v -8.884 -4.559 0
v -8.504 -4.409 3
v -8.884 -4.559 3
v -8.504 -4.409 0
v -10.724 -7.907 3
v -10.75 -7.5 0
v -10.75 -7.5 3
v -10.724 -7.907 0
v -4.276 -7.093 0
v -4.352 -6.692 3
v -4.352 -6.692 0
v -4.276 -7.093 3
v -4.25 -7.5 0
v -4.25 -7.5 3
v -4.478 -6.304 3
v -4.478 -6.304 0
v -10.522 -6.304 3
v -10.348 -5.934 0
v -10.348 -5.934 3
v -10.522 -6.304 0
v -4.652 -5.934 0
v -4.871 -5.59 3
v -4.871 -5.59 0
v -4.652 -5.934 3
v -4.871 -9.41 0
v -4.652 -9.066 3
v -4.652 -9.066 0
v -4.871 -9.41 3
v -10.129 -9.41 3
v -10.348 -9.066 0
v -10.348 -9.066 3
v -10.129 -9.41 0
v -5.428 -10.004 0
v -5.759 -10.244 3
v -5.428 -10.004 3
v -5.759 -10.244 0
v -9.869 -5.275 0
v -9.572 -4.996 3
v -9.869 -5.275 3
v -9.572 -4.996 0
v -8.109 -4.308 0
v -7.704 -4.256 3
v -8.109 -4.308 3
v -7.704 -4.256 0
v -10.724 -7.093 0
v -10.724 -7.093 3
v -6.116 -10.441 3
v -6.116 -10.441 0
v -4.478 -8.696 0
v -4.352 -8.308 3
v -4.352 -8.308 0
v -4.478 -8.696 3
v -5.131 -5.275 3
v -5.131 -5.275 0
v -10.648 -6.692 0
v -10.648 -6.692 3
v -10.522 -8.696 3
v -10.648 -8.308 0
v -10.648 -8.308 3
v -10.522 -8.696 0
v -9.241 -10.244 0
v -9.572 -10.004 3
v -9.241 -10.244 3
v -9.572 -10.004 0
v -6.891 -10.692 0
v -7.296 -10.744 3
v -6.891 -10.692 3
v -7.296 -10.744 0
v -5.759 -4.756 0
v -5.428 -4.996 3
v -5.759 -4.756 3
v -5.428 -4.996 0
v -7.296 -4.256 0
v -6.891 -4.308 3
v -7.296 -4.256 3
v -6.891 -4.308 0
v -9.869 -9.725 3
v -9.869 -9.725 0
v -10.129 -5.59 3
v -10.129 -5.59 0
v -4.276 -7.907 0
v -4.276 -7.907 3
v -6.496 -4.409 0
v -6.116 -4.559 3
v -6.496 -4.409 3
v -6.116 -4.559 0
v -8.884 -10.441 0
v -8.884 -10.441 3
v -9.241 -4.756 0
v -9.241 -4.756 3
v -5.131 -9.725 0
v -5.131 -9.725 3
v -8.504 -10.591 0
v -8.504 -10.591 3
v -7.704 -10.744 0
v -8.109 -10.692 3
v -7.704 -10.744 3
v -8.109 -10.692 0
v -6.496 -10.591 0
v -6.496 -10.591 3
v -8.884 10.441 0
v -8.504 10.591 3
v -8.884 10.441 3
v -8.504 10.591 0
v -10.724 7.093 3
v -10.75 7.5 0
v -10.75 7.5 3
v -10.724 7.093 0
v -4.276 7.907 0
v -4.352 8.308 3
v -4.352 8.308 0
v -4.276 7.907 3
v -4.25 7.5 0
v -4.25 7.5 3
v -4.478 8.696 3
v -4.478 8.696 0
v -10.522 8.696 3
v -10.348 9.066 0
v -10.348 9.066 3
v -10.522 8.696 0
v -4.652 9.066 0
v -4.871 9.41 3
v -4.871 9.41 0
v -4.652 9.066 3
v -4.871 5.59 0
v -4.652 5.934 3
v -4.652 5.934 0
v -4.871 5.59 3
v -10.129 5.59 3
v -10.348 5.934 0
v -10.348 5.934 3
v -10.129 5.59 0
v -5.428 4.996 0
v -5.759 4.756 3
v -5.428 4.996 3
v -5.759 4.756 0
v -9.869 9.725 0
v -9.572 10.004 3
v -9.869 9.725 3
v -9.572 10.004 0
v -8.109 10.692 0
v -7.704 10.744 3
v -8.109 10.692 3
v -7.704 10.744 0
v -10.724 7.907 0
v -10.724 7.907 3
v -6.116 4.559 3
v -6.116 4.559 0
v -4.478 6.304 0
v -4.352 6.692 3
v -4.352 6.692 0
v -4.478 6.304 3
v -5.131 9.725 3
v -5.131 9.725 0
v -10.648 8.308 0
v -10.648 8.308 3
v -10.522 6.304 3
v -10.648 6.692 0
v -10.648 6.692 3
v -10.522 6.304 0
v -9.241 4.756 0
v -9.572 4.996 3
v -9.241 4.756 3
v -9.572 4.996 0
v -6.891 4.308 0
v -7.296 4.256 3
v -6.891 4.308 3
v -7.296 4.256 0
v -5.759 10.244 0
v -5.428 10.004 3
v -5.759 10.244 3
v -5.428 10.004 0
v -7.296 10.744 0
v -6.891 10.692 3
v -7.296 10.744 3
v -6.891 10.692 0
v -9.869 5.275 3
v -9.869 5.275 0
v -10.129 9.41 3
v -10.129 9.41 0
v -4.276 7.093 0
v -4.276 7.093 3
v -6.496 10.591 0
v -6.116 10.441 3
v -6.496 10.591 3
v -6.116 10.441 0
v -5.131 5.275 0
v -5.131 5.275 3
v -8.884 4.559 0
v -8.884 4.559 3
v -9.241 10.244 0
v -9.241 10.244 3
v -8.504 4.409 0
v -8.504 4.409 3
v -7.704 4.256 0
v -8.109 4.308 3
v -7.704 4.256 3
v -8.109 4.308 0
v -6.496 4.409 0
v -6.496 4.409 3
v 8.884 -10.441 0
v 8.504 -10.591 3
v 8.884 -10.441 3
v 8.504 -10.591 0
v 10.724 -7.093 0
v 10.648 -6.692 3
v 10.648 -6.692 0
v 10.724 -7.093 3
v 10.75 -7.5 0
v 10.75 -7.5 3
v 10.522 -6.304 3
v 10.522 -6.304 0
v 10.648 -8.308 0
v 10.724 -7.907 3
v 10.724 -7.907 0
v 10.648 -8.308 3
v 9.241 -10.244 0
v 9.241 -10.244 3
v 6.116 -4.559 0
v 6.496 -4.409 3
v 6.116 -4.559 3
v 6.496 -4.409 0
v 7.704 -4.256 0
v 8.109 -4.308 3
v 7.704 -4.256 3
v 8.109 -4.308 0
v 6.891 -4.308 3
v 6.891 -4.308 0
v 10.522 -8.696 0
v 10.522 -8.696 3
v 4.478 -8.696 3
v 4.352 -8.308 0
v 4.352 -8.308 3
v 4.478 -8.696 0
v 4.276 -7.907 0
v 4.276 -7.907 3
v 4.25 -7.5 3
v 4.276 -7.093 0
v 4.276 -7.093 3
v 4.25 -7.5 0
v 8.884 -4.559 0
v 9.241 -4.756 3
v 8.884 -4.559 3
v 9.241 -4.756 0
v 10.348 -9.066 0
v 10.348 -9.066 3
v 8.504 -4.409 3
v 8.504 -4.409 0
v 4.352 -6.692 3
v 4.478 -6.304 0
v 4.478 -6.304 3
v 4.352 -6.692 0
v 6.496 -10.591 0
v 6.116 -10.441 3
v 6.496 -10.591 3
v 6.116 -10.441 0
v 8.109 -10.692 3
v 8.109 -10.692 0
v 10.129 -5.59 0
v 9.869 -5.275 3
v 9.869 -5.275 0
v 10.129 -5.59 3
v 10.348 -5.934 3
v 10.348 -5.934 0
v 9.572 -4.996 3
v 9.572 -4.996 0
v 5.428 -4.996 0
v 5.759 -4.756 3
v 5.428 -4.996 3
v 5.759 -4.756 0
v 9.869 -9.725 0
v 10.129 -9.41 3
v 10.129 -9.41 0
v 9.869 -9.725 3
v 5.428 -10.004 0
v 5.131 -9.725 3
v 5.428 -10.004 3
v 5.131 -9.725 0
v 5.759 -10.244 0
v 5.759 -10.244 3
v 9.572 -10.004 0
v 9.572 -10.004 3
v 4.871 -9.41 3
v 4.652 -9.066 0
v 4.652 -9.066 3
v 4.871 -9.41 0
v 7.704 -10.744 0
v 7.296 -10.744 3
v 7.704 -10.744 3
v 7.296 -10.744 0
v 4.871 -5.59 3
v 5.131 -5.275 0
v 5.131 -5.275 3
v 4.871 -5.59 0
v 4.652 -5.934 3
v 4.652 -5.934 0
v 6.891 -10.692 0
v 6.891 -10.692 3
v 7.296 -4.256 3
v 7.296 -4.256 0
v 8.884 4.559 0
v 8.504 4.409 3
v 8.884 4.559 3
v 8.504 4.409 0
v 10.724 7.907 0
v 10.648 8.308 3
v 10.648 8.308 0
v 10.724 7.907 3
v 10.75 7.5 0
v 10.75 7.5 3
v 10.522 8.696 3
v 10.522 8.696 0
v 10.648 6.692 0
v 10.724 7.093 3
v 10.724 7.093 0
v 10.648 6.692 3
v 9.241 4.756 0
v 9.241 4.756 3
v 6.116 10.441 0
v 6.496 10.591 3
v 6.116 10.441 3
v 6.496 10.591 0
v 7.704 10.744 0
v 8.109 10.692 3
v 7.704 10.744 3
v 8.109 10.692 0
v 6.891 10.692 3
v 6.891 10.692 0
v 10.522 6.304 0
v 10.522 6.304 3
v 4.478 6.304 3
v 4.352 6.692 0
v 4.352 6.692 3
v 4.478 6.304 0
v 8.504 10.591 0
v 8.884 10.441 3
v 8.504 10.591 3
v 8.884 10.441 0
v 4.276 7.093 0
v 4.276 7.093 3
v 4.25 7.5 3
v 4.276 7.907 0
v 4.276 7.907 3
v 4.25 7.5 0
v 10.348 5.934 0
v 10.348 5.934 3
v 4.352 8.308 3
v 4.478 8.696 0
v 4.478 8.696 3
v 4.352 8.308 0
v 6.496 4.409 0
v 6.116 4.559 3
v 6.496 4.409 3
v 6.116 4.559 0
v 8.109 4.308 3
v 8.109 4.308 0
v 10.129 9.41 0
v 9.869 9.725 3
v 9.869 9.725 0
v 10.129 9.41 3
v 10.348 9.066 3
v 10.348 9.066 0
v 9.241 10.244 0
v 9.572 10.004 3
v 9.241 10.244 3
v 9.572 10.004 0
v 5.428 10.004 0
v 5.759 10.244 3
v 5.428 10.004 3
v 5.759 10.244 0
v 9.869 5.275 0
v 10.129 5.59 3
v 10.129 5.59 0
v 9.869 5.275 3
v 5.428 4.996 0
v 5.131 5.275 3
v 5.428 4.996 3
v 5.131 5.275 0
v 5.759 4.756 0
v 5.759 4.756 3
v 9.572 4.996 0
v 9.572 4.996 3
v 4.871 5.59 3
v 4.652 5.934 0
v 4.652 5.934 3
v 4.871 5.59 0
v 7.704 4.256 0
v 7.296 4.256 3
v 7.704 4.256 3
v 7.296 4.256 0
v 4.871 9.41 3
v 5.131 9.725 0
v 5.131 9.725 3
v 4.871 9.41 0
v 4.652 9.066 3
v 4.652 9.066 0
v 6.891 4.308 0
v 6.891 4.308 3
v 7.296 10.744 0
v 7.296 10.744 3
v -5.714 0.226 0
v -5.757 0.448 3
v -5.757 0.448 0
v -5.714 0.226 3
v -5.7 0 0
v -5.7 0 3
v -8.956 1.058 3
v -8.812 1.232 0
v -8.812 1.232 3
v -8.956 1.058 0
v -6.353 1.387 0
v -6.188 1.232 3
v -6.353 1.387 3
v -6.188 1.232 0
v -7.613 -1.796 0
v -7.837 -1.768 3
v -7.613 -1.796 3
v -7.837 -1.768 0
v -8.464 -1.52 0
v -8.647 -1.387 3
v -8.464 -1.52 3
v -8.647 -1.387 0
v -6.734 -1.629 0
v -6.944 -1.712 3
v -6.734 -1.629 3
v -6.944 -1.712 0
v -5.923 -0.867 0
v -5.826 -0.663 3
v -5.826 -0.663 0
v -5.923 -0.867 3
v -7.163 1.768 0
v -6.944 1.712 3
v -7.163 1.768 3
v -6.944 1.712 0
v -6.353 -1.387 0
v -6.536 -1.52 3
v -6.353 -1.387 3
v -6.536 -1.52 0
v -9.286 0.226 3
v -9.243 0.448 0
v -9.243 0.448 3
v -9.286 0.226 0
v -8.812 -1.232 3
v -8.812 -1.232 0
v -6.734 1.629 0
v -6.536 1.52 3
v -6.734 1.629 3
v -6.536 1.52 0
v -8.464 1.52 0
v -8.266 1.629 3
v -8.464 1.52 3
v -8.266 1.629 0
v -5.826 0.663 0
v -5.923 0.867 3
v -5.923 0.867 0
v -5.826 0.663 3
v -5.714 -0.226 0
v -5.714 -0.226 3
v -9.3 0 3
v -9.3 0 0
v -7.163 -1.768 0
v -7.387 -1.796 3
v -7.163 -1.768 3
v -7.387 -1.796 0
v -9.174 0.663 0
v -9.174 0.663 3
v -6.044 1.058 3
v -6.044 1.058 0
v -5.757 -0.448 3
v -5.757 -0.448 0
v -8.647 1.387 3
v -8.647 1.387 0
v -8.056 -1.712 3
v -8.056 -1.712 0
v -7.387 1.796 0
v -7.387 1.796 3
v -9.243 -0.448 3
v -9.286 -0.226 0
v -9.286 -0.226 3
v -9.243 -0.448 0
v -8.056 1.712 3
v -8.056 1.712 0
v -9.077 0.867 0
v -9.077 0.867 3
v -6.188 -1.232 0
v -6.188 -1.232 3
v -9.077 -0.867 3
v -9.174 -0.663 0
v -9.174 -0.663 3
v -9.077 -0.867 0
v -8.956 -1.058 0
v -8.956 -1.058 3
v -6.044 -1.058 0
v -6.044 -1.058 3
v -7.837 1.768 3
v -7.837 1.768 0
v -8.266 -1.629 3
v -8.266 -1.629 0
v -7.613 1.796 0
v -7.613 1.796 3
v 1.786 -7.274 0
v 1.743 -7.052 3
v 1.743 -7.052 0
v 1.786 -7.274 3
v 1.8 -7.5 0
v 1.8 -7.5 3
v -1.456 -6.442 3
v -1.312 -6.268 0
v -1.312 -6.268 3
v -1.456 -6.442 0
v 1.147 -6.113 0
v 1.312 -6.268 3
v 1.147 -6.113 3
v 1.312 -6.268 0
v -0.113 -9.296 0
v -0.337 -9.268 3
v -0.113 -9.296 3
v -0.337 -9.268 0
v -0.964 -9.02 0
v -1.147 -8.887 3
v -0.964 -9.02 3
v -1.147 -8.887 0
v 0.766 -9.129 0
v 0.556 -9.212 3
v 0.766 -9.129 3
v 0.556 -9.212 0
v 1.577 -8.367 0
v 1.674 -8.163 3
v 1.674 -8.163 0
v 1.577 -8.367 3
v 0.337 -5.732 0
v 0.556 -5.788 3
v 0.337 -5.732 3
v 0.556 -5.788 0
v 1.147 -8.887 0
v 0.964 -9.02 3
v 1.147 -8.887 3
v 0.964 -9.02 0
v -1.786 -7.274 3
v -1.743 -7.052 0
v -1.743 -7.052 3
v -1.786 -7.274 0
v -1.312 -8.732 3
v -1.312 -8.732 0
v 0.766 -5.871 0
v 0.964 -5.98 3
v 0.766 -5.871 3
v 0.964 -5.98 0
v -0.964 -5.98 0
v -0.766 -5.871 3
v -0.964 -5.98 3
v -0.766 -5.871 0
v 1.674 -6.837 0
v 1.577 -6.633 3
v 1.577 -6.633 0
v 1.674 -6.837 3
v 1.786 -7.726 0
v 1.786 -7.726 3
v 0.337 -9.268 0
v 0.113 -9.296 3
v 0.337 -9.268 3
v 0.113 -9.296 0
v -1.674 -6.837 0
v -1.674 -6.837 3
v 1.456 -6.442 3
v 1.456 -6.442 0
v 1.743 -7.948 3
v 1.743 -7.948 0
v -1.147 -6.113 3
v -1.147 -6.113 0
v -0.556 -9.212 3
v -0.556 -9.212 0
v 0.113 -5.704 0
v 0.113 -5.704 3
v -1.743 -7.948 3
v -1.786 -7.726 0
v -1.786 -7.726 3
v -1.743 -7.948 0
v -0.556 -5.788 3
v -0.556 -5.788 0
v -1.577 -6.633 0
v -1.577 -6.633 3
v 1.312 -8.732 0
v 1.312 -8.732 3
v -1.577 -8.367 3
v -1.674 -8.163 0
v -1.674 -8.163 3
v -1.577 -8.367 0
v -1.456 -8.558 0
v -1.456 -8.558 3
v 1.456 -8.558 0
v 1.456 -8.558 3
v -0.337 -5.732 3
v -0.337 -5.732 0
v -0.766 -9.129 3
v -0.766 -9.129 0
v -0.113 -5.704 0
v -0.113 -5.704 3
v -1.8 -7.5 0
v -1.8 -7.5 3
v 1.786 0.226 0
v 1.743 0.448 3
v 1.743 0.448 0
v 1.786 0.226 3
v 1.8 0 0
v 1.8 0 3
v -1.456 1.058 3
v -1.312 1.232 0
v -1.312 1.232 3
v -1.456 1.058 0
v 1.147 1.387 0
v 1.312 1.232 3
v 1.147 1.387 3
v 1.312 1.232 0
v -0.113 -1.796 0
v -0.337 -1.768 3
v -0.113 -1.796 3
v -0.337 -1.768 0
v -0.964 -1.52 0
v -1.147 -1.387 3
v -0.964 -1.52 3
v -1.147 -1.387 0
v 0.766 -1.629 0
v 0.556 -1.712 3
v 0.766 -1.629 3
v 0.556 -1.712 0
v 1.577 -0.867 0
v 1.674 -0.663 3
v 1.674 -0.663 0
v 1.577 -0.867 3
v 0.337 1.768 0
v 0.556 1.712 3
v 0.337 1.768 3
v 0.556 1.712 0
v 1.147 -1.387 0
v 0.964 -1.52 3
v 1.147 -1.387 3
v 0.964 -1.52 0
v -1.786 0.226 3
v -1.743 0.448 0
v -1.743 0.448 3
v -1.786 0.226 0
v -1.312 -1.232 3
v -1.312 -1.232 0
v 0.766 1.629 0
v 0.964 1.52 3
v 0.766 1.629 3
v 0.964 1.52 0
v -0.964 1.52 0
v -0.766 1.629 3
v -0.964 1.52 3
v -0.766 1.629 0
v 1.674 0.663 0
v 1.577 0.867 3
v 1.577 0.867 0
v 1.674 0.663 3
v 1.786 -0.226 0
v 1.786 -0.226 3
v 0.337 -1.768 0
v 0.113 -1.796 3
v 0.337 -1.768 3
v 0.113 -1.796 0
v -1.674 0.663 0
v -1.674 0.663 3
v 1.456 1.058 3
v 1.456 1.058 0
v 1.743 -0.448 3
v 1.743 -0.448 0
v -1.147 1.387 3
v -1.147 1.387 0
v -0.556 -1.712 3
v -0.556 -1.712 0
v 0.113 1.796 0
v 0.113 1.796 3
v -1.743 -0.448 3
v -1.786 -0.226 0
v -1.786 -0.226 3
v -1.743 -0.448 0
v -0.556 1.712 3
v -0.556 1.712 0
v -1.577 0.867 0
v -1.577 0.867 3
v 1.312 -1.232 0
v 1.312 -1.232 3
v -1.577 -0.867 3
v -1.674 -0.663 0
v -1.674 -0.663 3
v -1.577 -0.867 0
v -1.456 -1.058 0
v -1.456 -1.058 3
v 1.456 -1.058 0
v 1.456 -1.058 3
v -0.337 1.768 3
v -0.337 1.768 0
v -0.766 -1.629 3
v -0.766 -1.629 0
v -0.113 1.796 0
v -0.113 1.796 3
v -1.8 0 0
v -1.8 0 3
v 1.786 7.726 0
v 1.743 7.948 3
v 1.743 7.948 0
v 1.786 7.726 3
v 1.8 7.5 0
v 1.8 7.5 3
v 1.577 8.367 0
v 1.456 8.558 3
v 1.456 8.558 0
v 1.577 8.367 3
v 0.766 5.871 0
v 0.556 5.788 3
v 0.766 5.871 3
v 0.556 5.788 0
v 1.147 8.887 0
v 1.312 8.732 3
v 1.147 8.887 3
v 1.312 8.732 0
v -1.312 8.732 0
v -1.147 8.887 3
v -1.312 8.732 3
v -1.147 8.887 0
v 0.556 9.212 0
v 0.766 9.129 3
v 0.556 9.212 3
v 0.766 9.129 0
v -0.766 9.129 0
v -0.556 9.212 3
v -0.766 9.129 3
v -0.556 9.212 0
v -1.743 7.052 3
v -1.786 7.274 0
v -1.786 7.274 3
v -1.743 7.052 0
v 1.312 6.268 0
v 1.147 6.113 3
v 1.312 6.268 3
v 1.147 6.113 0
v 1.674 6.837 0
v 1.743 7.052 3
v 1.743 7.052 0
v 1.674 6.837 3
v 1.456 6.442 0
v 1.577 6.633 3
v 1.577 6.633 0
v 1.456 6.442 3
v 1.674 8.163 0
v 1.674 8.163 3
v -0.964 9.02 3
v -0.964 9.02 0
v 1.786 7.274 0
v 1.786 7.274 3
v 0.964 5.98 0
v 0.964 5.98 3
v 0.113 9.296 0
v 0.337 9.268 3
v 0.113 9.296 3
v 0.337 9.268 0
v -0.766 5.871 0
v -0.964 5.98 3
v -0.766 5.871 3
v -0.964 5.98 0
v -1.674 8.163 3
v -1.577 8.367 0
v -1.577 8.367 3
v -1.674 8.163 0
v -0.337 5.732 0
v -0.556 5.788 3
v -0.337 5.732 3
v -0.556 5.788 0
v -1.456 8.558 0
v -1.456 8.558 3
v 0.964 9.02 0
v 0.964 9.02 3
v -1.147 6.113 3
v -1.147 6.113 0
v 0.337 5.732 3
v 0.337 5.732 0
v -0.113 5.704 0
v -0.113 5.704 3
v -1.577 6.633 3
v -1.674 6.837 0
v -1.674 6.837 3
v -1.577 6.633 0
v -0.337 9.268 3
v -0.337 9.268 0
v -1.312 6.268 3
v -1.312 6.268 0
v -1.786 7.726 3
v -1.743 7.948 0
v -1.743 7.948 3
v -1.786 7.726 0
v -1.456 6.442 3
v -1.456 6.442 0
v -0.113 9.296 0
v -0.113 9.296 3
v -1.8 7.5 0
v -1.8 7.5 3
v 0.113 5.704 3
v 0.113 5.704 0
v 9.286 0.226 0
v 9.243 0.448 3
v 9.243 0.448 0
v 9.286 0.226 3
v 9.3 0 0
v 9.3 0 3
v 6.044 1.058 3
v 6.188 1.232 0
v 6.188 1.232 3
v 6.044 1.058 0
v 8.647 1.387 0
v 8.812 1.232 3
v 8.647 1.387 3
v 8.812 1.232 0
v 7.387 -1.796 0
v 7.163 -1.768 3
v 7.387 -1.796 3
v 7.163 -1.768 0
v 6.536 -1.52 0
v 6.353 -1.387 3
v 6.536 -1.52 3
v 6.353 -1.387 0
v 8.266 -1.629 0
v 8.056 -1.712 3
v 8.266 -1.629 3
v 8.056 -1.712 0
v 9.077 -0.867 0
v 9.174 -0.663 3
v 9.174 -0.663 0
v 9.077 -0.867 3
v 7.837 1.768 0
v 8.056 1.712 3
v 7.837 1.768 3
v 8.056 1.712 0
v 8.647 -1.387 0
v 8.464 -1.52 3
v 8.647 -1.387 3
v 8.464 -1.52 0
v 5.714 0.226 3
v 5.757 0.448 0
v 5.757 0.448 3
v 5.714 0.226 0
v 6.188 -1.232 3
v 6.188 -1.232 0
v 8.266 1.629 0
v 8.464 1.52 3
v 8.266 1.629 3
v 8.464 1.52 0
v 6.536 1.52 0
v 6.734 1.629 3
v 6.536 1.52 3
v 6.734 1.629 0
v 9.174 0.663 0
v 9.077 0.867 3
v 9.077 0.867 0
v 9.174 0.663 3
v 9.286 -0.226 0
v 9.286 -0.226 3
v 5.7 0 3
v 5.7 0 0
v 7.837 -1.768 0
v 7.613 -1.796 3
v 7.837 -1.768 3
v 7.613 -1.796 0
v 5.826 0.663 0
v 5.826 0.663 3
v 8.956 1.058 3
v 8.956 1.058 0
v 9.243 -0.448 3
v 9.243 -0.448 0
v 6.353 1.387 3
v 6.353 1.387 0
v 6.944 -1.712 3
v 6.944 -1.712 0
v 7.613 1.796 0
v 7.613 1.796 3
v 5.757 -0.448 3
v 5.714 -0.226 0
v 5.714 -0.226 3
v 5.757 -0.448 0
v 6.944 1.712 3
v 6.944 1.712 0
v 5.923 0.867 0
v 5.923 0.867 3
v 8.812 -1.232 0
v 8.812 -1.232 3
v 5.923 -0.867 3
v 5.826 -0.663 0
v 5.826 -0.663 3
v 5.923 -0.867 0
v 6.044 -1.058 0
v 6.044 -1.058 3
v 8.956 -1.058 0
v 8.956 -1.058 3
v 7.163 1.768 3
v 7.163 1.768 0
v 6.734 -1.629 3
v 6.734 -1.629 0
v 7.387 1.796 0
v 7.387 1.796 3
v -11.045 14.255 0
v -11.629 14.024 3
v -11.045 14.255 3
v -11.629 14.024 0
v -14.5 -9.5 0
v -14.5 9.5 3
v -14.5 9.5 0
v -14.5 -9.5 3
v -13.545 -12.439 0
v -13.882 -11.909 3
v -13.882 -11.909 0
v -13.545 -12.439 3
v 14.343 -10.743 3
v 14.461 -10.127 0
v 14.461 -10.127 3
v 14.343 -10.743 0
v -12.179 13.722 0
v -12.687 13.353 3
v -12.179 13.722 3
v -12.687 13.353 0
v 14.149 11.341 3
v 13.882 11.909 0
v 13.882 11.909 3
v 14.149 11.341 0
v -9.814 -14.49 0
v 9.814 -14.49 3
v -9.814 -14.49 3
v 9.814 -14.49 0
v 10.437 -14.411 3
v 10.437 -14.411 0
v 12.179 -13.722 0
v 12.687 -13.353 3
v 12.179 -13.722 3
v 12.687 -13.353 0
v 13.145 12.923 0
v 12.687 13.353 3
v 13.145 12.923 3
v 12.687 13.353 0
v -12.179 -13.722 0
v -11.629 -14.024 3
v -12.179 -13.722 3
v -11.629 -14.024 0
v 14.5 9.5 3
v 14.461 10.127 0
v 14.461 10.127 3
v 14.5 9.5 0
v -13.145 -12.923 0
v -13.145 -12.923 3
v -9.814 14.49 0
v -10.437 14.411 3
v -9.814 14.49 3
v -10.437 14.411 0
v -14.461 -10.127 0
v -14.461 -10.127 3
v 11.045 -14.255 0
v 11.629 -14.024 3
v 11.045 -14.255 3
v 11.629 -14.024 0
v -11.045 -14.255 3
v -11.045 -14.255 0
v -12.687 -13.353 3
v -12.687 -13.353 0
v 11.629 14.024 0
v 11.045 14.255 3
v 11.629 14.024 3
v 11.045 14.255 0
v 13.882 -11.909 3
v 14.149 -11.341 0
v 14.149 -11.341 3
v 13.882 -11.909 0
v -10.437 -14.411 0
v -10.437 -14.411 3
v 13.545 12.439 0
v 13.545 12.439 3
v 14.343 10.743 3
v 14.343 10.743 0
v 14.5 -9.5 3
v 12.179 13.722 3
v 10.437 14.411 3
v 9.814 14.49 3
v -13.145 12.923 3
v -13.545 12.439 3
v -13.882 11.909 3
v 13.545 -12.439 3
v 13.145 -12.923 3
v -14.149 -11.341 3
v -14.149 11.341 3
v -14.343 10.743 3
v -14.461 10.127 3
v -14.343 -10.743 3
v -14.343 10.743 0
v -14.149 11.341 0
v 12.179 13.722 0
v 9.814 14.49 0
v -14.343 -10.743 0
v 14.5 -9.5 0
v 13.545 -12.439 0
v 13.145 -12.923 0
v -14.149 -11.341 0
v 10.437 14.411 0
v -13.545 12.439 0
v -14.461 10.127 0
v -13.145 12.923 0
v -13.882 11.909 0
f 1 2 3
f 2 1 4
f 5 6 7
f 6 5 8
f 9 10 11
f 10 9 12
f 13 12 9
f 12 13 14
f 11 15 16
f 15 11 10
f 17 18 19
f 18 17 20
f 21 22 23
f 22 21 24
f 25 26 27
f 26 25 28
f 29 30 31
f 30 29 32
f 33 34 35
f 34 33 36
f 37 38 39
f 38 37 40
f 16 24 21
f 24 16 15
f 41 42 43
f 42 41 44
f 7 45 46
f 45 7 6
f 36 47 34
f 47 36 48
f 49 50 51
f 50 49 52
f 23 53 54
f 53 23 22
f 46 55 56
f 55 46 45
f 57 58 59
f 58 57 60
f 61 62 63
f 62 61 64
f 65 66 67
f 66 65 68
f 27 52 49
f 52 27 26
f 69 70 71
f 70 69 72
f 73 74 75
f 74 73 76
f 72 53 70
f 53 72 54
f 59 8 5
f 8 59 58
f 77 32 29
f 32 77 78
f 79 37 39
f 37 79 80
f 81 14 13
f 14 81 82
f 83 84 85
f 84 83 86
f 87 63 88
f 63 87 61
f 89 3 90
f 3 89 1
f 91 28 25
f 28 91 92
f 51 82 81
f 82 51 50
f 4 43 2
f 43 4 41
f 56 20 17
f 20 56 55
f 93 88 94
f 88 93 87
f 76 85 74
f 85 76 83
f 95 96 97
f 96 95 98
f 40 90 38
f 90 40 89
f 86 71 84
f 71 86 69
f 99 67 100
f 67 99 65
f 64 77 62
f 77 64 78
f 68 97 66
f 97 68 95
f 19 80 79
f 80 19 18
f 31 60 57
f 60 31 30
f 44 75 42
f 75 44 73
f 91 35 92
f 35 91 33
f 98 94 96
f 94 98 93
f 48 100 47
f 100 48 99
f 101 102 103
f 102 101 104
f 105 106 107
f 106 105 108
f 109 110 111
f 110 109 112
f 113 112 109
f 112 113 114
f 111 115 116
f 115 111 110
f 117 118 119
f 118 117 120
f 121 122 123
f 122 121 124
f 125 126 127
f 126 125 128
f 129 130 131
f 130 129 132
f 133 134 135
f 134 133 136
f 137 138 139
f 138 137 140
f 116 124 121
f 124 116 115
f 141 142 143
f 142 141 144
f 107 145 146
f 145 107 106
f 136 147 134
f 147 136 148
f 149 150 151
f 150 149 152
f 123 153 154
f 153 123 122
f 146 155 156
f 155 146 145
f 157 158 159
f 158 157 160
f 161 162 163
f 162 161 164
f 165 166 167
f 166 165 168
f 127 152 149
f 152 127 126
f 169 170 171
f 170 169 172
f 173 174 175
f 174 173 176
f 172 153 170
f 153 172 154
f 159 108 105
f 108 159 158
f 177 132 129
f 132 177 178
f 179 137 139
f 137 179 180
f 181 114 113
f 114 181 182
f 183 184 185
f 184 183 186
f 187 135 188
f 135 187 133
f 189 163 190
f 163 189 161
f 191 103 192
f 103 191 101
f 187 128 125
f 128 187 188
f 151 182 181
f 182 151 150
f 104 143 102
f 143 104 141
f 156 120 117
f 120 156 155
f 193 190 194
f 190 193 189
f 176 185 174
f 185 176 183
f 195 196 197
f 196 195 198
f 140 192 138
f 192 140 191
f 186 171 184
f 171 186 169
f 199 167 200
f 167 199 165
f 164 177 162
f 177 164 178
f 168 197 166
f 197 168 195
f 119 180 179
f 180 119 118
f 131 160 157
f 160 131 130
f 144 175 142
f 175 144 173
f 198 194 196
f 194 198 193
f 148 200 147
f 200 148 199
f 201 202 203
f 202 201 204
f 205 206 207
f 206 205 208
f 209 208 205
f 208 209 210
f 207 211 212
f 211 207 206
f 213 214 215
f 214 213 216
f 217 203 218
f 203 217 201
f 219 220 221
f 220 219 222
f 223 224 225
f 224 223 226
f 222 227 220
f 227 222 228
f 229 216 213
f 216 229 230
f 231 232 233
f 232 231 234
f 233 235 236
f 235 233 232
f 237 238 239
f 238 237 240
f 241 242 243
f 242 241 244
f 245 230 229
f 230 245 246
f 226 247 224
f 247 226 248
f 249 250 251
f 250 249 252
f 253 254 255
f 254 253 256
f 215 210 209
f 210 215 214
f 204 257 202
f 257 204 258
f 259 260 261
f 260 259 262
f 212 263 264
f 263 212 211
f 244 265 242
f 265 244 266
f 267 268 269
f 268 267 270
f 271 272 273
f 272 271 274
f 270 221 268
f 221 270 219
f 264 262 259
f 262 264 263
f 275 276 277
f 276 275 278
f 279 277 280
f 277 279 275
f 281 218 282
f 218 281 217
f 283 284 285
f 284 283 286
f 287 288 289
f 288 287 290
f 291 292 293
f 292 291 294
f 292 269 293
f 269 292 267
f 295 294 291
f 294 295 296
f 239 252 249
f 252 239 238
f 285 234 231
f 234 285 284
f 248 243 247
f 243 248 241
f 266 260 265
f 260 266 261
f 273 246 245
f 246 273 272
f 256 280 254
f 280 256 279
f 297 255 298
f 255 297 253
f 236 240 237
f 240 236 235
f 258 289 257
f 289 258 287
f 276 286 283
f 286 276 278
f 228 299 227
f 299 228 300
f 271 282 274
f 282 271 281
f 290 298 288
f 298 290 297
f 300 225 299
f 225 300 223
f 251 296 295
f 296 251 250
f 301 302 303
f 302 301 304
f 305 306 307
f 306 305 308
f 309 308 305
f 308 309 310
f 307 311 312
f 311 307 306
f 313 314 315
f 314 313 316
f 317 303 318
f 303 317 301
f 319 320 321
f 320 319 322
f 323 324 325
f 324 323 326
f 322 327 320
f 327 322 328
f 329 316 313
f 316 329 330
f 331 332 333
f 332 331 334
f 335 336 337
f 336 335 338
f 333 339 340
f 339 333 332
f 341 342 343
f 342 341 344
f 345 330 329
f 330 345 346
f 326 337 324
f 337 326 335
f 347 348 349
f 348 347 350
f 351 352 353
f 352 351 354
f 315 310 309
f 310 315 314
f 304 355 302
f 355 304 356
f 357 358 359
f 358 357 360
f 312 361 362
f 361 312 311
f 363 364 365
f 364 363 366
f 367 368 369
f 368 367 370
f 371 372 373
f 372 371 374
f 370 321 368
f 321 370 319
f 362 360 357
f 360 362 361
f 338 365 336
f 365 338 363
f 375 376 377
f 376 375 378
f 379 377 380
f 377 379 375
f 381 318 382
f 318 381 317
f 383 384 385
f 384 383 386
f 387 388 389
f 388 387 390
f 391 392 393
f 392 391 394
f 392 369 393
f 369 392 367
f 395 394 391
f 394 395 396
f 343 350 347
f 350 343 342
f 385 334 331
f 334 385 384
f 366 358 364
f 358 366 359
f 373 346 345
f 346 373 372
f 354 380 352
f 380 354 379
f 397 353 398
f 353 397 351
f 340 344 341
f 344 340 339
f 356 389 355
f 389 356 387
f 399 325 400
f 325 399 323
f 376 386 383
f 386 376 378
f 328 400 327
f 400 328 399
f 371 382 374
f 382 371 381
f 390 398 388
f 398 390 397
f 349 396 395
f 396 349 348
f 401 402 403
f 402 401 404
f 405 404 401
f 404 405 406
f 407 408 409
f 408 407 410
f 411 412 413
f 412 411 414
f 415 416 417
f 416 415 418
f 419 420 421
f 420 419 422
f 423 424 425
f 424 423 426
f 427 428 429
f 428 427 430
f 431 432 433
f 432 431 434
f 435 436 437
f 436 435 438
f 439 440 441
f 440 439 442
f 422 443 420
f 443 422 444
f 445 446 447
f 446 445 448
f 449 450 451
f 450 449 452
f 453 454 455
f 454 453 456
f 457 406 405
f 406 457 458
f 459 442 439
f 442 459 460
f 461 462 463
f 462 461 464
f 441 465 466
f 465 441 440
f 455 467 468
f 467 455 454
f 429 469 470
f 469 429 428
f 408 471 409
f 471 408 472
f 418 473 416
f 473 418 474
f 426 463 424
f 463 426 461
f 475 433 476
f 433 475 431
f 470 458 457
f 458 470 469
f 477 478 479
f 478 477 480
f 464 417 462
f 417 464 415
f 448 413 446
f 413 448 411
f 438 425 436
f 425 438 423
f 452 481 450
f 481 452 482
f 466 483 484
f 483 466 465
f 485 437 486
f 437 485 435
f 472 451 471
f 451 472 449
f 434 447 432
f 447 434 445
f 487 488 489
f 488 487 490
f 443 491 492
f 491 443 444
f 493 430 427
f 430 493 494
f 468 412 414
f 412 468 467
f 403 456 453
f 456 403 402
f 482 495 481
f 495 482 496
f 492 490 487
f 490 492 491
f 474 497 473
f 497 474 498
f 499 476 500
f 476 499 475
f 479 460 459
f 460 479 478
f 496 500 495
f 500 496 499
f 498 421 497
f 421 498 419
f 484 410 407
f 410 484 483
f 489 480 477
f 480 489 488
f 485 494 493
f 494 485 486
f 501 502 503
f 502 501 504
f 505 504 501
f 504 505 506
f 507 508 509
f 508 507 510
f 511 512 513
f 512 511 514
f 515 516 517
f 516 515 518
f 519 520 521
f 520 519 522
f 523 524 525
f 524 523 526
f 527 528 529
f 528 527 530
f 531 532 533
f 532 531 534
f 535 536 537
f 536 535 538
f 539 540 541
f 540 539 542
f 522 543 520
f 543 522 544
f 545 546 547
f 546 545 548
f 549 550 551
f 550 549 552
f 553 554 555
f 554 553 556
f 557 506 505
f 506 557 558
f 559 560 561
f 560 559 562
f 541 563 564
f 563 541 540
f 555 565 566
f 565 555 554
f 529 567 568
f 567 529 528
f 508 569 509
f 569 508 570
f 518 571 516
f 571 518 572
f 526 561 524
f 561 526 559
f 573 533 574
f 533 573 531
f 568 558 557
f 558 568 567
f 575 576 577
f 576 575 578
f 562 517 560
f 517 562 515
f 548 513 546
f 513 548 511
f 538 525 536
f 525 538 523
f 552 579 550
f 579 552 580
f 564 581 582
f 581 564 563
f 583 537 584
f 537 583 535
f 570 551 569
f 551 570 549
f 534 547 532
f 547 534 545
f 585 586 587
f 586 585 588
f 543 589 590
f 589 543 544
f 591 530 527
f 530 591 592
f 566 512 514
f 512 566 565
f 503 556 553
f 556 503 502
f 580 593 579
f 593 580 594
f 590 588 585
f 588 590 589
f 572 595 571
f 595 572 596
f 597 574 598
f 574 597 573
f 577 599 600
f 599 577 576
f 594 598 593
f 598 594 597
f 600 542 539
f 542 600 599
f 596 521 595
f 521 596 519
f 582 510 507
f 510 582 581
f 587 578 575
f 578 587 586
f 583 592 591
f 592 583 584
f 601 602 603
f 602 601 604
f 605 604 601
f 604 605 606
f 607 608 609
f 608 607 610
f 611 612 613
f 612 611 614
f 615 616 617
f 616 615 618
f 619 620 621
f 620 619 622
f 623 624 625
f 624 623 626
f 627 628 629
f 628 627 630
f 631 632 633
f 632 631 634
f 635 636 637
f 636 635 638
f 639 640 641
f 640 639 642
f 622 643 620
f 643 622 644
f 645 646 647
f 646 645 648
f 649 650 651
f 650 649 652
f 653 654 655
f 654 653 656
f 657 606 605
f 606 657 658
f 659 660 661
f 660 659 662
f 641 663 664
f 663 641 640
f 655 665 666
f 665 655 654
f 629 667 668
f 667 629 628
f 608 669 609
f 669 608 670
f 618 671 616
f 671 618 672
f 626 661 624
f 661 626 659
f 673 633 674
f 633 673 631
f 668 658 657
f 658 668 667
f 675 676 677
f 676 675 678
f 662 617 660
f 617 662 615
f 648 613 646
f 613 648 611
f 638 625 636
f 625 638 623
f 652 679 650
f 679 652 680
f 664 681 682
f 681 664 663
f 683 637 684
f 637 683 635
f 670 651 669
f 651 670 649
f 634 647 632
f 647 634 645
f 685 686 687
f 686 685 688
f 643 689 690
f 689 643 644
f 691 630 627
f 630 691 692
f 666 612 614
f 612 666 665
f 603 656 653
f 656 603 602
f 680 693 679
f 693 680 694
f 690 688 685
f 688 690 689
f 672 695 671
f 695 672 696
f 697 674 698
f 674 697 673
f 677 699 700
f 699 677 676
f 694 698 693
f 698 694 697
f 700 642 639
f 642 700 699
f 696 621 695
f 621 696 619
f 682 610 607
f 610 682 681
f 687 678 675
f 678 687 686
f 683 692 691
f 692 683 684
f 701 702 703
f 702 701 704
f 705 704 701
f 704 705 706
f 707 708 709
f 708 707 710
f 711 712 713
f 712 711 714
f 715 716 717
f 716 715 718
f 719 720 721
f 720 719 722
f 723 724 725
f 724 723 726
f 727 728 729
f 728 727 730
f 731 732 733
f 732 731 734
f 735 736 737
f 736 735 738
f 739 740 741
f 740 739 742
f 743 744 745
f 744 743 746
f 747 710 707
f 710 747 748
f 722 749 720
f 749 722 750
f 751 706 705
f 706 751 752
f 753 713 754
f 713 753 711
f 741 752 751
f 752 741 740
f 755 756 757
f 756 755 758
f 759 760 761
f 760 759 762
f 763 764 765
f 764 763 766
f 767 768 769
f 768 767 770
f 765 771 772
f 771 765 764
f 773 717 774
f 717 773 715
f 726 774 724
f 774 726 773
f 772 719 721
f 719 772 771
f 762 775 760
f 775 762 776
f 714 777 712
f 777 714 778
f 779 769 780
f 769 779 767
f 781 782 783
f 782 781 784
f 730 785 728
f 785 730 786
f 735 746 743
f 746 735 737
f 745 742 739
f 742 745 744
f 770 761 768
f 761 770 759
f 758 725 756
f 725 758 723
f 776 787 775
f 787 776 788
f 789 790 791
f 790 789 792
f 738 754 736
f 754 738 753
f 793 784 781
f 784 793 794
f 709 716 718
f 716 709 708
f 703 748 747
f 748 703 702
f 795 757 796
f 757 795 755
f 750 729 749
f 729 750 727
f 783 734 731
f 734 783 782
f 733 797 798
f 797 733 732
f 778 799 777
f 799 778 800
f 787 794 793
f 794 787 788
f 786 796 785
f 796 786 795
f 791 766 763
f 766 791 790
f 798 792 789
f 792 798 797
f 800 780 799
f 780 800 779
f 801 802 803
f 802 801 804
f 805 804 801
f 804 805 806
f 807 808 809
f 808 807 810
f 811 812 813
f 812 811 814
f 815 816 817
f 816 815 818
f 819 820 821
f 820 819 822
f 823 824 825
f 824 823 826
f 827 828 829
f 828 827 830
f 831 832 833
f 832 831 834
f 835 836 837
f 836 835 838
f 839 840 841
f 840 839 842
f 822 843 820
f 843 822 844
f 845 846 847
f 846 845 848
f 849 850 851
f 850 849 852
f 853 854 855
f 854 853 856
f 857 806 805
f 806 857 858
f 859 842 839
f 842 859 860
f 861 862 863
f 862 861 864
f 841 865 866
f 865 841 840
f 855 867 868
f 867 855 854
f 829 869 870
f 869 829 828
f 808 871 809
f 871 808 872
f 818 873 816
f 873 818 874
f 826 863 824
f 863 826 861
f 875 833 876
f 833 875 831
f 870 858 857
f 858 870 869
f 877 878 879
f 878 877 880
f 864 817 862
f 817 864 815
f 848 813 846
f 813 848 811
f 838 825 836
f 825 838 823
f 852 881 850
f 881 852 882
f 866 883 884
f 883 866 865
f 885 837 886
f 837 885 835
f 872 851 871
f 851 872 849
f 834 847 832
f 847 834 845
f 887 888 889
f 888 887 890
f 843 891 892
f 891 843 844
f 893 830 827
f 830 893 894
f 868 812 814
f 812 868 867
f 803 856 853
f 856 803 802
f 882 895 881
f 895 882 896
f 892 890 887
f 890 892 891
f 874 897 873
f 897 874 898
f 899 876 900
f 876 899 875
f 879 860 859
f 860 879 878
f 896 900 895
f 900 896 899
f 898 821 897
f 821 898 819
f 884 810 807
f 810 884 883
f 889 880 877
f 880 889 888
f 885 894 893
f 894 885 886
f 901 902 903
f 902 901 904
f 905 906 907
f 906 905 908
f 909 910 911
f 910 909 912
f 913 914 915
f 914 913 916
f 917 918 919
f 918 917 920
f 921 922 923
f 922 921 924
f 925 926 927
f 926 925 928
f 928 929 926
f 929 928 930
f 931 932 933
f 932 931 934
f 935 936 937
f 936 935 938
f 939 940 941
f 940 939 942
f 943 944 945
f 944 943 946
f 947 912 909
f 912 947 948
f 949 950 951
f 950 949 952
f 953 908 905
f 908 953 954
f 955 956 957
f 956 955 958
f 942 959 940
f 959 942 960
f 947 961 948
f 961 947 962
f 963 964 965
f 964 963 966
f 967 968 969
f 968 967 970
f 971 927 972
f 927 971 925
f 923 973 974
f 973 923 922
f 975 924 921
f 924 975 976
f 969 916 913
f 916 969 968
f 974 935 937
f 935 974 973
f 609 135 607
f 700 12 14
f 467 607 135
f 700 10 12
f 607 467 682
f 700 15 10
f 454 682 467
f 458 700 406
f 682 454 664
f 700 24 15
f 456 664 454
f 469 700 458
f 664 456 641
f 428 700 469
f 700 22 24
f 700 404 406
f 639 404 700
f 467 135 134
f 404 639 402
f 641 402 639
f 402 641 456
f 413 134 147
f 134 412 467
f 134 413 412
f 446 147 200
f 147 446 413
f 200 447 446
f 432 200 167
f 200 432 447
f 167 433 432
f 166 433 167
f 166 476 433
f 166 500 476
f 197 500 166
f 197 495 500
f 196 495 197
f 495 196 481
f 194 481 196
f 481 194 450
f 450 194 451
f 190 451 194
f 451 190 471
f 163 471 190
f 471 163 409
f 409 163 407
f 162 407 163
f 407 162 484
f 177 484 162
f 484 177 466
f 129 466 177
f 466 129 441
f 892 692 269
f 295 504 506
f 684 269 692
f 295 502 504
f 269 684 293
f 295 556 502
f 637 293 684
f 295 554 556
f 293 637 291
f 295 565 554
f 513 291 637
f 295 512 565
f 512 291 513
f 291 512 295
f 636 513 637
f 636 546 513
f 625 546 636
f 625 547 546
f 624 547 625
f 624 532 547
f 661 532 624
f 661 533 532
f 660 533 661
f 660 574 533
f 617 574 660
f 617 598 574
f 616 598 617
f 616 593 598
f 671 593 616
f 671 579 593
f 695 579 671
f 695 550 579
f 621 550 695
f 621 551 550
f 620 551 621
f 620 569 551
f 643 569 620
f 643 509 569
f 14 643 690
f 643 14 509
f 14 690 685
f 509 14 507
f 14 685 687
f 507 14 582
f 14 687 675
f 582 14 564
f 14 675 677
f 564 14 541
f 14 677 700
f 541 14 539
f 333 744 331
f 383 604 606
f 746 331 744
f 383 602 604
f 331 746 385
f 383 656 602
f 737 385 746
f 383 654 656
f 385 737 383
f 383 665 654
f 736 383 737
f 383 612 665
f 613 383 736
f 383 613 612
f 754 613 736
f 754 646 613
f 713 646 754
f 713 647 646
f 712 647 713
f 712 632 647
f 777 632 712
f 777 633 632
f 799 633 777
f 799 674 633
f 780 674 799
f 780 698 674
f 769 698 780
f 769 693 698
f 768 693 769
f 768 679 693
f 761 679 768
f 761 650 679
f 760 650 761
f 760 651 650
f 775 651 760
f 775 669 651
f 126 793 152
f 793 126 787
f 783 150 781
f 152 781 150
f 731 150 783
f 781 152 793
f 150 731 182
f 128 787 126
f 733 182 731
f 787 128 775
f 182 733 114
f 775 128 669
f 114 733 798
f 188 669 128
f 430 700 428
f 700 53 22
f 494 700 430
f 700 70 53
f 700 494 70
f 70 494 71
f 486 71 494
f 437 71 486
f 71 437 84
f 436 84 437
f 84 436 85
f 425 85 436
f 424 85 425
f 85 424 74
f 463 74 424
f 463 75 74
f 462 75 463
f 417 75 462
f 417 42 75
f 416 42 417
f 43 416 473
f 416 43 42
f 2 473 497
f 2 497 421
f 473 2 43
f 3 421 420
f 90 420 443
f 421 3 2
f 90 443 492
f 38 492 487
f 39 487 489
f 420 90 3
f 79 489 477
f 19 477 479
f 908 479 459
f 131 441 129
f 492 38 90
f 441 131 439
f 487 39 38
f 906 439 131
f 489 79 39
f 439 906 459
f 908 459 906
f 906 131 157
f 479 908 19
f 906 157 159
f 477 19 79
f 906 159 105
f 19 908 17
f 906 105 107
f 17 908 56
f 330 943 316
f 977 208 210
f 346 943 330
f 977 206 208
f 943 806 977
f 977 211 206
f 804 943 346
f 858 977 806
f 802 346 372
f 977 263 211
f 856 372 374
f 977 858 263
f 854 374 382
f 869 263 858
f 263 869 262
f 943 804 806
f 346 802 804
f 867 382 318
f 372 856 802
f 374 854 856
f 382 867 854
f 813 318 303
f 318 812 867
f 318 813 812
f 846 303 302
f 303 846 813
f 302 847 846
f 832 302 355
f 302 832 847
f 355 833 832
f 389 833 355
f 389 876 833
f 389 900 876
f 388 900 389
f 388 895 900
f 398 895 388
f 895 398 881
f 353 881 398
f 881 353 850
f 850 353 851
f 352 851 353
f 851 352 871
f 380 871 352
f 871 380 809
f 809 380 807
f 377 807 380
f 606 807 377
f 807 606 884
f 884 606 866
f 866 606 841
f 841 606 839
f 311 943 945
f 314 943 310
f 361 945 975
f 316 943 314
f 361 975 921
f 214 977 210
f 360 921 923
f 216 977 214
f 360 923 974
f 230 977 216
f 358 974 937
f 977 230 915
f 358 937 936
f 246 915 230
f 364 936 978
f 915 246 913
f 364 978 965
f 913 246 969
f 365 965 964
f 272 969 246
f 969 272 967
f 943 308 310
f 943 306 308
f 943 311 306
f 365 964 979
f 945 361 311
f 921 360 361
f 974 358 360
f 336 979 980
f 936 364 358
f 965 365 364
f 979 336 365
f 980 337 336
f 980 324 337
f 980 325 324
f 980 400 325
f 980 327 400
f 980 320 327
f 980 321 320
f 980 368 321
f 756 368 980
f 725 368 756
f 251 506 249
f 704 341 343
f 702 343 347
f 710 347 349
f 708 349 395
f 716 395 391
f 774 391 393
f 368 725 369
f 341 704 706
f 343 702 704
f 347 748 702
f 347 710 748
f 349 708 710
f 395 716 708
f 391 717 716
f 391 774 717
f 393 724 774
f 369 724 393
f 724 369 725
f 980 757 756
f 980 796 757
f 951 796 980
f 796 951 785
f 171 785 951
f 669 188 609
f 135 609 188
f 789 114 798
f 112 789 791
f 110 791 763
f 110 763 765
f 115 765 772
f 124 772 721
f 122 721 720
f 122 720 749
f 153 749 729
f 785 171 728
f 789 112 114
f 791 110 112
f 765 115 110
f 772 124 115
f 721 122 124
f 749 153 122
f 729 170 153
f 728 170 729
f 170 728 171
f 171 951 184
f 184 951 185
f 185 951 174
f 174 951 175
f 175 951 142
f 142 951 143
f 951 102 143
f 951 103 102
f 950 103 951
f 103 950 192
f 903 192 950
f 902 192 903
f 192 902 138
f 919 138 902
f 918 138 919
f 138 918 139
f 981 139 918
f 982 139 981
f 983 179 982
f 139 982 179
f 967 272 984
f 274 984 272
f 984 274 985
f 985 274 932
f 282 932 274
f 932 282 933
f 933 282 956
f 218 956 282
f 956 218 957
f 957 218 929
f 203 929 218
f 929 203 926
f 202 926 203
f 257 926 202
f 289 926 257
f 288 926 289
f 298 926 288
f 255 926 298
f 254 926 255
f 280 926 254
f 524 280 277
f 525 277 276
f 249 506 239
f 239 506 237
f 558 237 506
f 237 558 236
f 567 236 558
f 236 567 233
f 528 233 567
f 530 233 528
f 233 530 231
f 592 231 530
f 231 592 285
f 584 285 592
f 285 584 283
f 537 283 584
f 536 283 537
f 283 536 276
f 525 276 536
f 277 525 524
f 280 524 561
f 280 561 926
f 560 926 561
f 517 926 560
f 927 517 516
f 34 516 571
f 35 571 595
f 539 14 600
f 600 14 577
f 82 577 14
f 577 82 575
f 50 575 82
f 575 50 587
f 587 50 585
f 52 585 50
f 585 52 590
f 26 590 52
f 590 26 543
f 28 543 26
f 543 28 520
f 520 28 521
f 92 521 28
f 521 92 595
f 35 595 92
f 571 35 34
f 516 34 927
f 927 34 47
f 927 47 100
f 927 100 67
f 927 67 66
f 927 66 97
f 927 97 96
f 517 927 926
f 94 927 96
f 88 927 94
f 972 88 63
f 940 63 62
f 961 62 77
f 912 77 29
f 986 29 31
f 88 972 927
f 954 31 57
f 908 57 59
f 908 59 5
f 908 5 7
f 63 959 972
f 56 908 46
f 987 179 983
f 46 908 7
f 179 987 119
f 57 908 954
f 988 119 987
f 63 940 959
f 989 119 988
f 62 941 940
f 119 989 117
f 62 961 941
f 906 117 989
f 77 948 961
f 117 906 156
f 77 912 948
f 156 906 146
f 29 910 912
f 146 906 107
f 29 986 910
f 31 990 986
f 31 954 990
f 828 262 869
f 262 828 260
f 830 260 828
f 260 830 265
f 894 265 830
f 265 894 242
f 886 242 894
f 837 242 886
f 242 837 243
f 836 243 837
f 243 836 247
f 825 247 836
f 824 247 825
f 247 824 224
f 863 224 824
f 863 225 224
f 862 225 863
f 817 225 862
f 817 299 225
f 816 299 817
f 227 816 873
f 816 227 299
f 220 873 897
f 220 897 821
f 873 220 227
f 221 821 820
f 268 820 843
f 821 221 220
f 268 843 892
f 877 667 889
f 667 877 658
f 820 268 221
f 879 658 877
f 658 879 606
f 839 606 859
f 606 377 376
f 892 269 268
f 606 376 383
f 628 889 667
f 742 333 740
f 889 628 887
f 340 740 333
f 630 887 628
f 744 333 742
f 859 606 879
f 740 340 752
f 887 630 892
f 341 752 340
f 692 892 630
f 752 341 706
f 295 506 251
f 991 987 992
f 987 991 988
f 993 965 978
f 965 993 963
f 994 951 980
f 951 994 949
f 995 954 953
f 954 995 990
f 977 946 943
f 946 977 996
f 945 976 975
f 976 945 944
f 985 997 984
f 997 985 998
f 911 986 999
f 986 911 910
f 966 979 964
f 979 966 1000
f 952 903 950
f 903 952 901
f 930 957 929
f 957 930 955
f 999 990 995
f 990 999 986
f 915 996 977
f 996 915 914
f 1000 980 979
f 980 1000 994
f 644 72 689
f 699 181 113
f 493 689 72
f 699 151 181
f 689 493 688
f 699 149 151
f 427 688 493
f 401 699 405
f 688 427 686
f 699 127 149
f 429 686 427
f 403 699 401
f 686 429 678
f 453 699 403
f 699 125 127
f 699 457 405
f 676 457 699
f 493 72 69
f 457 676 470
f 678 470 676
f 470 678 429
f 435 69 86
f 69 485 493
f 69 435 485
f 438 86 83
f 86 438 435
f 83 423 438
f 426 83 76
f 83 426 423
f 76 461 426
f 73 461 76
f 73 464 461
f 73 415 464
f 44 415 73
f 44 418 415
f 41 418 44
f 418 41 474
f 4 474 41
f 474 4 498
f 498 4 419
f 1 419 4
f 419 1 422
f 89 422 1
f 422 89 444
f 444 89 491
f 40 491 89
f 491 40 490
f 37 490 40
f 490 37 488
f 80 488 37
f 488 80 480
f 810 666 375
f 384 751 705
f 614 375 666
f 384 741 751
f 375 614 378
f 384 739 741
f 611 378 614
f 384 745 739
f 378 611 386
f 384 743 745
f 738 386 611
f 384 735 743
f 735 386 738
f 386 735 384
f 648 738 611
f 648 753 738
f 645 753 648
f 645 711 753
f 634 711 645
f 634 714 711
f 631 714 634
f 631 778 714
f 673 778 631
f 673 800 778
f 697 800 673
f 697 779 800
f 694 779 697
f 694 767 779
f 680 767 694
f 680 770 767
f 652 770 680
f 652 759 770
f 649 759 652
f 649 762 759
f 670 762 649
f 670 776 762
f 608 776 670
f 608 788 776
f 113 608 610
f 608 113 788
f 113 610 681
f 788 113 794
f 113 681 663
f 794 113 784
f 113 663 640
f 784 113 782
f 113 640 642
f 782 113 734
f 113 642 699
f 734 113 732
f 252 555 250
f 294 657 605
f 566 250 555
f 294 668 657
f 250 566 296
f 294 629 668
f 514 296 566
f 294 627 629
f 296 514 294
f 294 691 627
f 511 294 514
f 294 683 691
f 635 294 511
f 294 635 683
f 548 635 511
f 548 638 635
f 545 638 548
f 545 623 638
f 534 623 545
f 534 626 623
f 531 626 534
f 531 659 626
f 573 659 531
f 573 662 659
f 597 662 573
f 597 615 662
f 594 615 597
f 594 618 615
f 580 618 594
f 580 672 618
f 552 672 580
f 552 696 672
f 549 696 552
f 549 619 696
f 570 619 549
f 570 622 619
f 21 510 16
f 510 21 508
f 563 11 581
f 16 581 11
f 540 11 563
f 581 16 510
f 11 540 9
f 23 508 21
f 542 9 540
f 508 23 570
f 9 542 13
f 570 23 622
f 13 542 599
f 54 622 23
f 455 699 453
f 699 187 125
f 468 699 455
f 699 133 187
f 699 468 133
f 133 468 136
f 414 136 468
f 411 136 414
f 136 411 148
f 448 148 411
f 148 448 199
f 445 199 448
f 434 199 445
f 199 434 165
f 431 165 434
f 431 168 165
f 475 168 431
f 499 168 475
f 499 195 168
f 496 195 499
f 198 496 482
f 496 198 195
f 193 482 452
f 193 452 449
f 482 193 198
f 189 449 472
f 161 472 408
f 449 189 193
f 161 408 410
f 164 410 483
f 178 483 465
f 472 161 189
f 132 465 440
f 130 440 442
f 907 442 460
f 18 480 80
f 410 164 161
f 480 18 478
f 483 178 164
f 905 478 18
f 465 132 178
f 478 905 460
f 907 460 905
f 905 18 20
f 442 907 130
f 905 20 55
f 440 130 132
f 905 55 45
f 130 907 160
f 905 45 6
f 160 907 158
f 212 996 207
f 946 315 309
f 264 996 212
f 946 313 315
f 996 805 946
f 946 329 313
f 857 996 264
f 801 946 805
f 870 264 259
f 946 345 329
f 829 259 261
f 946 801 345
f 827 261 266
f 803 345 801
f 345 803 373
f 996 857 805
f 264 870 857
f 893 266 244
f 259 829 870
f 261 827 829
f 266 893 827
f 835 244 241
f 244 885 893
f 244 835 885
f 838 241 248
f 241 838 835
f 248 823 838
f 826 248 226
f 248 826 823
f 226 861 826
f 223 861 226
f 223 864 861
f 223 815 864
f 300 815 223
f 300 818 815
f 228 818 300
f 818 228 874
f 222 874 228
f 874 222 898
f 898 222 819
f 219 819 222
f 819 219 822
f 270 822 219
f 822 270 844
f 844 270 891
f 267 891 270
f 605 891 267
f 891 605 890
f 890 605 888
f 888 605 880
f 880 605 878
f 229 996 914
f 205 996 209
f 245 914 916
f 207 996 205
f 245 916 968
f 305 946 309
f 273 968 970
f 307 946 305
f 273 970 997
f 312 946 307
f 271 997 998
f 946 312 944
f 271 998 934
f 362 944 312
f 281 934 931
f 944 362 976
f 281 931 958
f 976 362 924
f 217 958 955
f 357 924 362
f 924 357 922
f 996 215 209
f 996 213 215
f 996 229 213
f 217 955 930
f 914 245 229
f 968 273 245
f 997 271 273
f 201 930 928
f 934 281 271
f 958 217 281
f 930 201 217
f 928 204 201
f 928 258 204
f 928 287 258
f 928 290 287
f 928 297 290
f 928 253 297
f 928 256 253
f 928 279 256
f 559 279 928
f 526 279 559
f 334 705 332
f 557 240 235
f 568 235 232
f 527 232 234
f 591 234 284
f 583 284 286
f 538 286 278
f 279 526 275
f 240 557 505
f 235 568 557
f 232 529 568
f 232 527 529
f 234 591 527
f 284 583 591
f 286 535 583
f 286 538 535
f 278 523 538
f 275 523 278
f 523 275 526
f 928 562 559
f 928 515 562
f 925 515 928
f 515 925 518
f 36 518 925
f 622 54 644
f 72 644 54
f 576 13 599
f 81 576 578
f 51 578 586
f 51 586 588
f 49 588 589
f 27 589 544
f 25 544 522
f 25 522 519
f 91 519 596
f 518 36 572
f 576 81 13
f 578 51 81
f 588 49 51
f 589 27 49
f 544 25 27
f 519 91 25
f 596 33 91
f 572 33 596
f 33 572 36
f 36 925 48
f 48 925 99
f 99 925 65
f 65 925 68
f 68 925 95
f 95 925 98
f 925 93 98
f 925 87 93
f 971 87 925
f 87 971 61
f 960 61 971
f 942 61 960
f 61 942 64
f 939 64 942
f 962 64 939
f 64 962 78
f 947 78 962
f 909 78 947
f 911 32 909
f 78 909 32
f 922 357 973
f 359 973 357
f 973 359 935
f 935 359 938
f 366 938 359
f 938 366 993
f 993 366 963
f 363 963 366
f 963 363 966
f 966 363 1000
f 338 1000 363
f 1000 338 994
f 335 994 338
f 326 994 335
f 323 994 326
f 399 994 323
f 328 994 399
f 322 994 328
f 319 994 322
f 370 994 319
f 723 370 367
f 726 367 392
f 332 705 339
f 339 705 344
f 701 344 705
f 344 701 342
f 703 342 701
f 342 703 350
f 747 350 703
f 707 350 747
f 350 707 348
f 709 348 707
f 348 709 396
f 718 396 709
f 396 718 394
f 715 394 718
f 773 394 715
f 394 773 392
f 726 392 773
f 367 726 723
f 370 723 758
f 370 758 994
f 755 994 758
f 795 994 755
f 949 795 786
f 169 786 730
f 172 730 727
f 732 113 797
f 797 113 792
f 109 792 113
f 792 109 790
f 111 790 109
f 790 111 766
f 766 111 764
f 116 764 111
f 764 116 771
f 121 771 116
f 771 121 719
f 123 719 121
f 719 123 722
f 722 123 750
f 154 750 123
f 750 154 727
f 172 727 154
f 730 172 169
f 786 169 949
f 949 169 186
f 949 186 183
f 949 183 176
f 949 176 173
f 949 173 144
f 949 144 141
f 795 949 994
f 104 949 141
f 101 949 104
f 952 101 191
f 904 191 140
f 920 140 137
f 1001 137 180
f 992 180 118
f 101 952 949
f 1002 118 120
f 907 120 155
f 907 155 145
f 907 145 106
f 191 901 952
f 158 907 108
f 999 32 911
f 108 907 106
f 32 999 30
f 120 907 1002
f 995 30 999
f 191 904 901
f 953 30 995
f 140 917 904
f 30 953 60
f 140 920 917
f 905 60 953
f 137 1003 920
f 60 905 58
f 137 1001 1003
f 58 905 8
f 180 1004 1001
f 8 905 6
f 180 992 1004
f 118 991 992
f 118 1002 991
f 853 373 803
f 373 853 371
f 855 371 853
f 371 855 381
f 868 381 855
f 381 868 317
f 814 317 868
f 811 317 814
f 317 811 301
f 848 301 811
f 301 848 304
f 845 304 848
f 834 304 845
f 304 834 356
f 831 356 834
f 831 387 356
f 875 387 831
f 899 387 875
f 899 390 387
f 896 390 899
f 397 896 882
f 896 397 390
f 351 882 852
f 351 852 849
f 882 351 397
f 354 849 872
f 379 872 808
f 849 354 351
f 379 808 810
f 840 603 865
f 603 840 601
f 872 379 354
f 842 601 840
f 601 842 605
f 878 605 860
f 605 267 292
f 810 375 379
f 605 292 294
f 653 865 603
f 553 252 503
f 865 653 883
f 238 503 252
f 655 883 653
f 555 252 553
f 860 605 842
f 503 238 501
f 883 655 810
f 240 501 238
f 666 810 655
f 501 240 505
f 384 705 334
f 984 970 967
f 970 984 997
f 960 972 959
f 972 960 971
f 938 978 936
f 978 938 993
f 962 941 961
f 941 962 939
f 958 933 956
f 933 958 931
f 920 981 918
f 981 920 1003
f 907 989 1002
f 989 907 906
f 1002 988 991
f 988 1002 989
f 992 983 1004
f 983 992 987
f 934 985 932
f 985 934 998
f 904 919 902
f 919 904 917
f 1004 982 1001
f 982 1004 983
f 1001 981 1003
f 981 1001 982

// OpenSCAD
$fn = 50;


difference() {
	union() {
		*color(alpha = 1.0000000000, c = "gray") {
			translate(v = [0, 7, 0]) {
				linear_extrude(height = 1) {
					text(font = "Arial:style=Bold", halign = "center", size = 4.5000000000, text = "COMMENT plate main", valign = "center");
				}
			}
		}
		*color(alpha = 1.0000000000, c = "gray") {
			translate(v = [0, 14, 0]) {
				linear_extrude(height = 2) {
					text(font = "Arial:style=Bold", halign = "center", size = 4.5000000000, text = "COMMENT description oobb_plate_shape_p_type_3_depth_2_width_2_height_3_thickness_true_both_holes", valign = "center");
				}
			}
		}
		hull() {
			translate(v = [-9.5000000000, 9.5000000000, 0]) {
				cylinder(h = 3, r = 5);
			}
			translate(v = [9.5000000000, 9.5000000000, 0]) {
				cylinder(h = 3, r = 5);
			}
			translate(v = [-9.5000000000, -9.5000000000, 0]) {
				cylinder(h = 3, r = 5);
			}
			translate(v = [9.5000000000, -9.5000000000, 0]) {
				cylinder(h = 3, r = 5);
			}
		}
	}
	union() {
		*color(alpha = 1.0000000000, c = "gray") {
			translate(v = [0, 7, 0]) {
				linear_extrude(height = 1) {
					text(font = "Arial:style=Bold", halign = "center", size = 4.5000000000, text = "COMMENT holes main", valign = "center");
				}
			}
		}
		*color(alpha = 1.0000000000, c = "gray") {
			translate(v = [0, 14, 0]) {
				linear_extrude(height = 2) {
					text(font = "Arial:style=Bold", halign = "center", size = 4.5000000000, text = "COMMENT description oobb_holes_shape_n_type_2_width_2_height_3_thickness_true_both_holes", valign = "center");
				}
			}
		}
		translate(v = [-7.5000000000, -7.5000000000, 0]) {
			translate(v = [0, 0, -50]) {
				cylinder(h = 100, r = 3.2500000000);
			}
		}
		translate(v = [-7.5000000000, 7.5000000000, 0]) {
			translate(v = [0, 0, -50]) {
				cylinder(h = 100, r = 3.2500000000);
			}
		}
		translate(v = [7.5000000000, -7.5000000000, 0]) {
			translate(v = [0, 0, -50]) {
				cylinder(h = 100, r = 3.2500000000);
			}
		}
		translate(v = [7.5000000000, 7.5000000000, 0]) {
			translate(v = [0, 0, -50]) {
				cylinder(h = 100, r = 3.2500000000);
			}
		}
		translate(v = [-7.5000000000, -7.5000000000, 0]) {
			translate(v = [0, 0, -50]) {
				cylinder(h = 100, r = 1.8000000000);
			}
		}
		translate(v = [-7.5000000000, 0.0000000000, 0]) {
			translate(v = [0, 0, -50]) {
				cylinder(h = 100, r = 1.8000000000);
			}
		}
		translate(v = [-7.5000000000, 7.5000000000, 0]) {
			translate(v = [0, 0, -50]) {
				cylinder(h = 100, r = 1.8000000000);
			}
		}
		translate(v = [0.0000000000, -7.5000000000, 0]) {
			translate(v = [0, 0, -50]) {
				cylinder(h = 100, r = 1.8000000000);
			}
		}
		translate(v = [0, 0, -50]) {
			cylinder(h = 100, r = 1.8000000000);
		}
		translate(v = [0.0000000000, 7.5000000000, 0]) {
			translate(v = [0, 0, -50]) {
				cylinder(h = 100, r = 1.8000000000);
			}
		}
		translate(v = [7.5000000000, -7.5000000000, 0]) {
			translate(v = [0, 0, -50]) {
				cylinder(h = 100, r = 1.8000000000);
			}
		}
		translate(v = [7.5000000000, 0.0000000000, 0]) {
			translate(v = [0, 0, -50]) {
				cylinder(h = 100, r = 1.8000000000);
			}
		}
		translate(v = [7.5000000000, 7.5000000000, 0]) {
			translate(v = [0, 0, -50]) {
				cylinder(h = 100, r = 1.8000000000);
			}
		}
	}
}
